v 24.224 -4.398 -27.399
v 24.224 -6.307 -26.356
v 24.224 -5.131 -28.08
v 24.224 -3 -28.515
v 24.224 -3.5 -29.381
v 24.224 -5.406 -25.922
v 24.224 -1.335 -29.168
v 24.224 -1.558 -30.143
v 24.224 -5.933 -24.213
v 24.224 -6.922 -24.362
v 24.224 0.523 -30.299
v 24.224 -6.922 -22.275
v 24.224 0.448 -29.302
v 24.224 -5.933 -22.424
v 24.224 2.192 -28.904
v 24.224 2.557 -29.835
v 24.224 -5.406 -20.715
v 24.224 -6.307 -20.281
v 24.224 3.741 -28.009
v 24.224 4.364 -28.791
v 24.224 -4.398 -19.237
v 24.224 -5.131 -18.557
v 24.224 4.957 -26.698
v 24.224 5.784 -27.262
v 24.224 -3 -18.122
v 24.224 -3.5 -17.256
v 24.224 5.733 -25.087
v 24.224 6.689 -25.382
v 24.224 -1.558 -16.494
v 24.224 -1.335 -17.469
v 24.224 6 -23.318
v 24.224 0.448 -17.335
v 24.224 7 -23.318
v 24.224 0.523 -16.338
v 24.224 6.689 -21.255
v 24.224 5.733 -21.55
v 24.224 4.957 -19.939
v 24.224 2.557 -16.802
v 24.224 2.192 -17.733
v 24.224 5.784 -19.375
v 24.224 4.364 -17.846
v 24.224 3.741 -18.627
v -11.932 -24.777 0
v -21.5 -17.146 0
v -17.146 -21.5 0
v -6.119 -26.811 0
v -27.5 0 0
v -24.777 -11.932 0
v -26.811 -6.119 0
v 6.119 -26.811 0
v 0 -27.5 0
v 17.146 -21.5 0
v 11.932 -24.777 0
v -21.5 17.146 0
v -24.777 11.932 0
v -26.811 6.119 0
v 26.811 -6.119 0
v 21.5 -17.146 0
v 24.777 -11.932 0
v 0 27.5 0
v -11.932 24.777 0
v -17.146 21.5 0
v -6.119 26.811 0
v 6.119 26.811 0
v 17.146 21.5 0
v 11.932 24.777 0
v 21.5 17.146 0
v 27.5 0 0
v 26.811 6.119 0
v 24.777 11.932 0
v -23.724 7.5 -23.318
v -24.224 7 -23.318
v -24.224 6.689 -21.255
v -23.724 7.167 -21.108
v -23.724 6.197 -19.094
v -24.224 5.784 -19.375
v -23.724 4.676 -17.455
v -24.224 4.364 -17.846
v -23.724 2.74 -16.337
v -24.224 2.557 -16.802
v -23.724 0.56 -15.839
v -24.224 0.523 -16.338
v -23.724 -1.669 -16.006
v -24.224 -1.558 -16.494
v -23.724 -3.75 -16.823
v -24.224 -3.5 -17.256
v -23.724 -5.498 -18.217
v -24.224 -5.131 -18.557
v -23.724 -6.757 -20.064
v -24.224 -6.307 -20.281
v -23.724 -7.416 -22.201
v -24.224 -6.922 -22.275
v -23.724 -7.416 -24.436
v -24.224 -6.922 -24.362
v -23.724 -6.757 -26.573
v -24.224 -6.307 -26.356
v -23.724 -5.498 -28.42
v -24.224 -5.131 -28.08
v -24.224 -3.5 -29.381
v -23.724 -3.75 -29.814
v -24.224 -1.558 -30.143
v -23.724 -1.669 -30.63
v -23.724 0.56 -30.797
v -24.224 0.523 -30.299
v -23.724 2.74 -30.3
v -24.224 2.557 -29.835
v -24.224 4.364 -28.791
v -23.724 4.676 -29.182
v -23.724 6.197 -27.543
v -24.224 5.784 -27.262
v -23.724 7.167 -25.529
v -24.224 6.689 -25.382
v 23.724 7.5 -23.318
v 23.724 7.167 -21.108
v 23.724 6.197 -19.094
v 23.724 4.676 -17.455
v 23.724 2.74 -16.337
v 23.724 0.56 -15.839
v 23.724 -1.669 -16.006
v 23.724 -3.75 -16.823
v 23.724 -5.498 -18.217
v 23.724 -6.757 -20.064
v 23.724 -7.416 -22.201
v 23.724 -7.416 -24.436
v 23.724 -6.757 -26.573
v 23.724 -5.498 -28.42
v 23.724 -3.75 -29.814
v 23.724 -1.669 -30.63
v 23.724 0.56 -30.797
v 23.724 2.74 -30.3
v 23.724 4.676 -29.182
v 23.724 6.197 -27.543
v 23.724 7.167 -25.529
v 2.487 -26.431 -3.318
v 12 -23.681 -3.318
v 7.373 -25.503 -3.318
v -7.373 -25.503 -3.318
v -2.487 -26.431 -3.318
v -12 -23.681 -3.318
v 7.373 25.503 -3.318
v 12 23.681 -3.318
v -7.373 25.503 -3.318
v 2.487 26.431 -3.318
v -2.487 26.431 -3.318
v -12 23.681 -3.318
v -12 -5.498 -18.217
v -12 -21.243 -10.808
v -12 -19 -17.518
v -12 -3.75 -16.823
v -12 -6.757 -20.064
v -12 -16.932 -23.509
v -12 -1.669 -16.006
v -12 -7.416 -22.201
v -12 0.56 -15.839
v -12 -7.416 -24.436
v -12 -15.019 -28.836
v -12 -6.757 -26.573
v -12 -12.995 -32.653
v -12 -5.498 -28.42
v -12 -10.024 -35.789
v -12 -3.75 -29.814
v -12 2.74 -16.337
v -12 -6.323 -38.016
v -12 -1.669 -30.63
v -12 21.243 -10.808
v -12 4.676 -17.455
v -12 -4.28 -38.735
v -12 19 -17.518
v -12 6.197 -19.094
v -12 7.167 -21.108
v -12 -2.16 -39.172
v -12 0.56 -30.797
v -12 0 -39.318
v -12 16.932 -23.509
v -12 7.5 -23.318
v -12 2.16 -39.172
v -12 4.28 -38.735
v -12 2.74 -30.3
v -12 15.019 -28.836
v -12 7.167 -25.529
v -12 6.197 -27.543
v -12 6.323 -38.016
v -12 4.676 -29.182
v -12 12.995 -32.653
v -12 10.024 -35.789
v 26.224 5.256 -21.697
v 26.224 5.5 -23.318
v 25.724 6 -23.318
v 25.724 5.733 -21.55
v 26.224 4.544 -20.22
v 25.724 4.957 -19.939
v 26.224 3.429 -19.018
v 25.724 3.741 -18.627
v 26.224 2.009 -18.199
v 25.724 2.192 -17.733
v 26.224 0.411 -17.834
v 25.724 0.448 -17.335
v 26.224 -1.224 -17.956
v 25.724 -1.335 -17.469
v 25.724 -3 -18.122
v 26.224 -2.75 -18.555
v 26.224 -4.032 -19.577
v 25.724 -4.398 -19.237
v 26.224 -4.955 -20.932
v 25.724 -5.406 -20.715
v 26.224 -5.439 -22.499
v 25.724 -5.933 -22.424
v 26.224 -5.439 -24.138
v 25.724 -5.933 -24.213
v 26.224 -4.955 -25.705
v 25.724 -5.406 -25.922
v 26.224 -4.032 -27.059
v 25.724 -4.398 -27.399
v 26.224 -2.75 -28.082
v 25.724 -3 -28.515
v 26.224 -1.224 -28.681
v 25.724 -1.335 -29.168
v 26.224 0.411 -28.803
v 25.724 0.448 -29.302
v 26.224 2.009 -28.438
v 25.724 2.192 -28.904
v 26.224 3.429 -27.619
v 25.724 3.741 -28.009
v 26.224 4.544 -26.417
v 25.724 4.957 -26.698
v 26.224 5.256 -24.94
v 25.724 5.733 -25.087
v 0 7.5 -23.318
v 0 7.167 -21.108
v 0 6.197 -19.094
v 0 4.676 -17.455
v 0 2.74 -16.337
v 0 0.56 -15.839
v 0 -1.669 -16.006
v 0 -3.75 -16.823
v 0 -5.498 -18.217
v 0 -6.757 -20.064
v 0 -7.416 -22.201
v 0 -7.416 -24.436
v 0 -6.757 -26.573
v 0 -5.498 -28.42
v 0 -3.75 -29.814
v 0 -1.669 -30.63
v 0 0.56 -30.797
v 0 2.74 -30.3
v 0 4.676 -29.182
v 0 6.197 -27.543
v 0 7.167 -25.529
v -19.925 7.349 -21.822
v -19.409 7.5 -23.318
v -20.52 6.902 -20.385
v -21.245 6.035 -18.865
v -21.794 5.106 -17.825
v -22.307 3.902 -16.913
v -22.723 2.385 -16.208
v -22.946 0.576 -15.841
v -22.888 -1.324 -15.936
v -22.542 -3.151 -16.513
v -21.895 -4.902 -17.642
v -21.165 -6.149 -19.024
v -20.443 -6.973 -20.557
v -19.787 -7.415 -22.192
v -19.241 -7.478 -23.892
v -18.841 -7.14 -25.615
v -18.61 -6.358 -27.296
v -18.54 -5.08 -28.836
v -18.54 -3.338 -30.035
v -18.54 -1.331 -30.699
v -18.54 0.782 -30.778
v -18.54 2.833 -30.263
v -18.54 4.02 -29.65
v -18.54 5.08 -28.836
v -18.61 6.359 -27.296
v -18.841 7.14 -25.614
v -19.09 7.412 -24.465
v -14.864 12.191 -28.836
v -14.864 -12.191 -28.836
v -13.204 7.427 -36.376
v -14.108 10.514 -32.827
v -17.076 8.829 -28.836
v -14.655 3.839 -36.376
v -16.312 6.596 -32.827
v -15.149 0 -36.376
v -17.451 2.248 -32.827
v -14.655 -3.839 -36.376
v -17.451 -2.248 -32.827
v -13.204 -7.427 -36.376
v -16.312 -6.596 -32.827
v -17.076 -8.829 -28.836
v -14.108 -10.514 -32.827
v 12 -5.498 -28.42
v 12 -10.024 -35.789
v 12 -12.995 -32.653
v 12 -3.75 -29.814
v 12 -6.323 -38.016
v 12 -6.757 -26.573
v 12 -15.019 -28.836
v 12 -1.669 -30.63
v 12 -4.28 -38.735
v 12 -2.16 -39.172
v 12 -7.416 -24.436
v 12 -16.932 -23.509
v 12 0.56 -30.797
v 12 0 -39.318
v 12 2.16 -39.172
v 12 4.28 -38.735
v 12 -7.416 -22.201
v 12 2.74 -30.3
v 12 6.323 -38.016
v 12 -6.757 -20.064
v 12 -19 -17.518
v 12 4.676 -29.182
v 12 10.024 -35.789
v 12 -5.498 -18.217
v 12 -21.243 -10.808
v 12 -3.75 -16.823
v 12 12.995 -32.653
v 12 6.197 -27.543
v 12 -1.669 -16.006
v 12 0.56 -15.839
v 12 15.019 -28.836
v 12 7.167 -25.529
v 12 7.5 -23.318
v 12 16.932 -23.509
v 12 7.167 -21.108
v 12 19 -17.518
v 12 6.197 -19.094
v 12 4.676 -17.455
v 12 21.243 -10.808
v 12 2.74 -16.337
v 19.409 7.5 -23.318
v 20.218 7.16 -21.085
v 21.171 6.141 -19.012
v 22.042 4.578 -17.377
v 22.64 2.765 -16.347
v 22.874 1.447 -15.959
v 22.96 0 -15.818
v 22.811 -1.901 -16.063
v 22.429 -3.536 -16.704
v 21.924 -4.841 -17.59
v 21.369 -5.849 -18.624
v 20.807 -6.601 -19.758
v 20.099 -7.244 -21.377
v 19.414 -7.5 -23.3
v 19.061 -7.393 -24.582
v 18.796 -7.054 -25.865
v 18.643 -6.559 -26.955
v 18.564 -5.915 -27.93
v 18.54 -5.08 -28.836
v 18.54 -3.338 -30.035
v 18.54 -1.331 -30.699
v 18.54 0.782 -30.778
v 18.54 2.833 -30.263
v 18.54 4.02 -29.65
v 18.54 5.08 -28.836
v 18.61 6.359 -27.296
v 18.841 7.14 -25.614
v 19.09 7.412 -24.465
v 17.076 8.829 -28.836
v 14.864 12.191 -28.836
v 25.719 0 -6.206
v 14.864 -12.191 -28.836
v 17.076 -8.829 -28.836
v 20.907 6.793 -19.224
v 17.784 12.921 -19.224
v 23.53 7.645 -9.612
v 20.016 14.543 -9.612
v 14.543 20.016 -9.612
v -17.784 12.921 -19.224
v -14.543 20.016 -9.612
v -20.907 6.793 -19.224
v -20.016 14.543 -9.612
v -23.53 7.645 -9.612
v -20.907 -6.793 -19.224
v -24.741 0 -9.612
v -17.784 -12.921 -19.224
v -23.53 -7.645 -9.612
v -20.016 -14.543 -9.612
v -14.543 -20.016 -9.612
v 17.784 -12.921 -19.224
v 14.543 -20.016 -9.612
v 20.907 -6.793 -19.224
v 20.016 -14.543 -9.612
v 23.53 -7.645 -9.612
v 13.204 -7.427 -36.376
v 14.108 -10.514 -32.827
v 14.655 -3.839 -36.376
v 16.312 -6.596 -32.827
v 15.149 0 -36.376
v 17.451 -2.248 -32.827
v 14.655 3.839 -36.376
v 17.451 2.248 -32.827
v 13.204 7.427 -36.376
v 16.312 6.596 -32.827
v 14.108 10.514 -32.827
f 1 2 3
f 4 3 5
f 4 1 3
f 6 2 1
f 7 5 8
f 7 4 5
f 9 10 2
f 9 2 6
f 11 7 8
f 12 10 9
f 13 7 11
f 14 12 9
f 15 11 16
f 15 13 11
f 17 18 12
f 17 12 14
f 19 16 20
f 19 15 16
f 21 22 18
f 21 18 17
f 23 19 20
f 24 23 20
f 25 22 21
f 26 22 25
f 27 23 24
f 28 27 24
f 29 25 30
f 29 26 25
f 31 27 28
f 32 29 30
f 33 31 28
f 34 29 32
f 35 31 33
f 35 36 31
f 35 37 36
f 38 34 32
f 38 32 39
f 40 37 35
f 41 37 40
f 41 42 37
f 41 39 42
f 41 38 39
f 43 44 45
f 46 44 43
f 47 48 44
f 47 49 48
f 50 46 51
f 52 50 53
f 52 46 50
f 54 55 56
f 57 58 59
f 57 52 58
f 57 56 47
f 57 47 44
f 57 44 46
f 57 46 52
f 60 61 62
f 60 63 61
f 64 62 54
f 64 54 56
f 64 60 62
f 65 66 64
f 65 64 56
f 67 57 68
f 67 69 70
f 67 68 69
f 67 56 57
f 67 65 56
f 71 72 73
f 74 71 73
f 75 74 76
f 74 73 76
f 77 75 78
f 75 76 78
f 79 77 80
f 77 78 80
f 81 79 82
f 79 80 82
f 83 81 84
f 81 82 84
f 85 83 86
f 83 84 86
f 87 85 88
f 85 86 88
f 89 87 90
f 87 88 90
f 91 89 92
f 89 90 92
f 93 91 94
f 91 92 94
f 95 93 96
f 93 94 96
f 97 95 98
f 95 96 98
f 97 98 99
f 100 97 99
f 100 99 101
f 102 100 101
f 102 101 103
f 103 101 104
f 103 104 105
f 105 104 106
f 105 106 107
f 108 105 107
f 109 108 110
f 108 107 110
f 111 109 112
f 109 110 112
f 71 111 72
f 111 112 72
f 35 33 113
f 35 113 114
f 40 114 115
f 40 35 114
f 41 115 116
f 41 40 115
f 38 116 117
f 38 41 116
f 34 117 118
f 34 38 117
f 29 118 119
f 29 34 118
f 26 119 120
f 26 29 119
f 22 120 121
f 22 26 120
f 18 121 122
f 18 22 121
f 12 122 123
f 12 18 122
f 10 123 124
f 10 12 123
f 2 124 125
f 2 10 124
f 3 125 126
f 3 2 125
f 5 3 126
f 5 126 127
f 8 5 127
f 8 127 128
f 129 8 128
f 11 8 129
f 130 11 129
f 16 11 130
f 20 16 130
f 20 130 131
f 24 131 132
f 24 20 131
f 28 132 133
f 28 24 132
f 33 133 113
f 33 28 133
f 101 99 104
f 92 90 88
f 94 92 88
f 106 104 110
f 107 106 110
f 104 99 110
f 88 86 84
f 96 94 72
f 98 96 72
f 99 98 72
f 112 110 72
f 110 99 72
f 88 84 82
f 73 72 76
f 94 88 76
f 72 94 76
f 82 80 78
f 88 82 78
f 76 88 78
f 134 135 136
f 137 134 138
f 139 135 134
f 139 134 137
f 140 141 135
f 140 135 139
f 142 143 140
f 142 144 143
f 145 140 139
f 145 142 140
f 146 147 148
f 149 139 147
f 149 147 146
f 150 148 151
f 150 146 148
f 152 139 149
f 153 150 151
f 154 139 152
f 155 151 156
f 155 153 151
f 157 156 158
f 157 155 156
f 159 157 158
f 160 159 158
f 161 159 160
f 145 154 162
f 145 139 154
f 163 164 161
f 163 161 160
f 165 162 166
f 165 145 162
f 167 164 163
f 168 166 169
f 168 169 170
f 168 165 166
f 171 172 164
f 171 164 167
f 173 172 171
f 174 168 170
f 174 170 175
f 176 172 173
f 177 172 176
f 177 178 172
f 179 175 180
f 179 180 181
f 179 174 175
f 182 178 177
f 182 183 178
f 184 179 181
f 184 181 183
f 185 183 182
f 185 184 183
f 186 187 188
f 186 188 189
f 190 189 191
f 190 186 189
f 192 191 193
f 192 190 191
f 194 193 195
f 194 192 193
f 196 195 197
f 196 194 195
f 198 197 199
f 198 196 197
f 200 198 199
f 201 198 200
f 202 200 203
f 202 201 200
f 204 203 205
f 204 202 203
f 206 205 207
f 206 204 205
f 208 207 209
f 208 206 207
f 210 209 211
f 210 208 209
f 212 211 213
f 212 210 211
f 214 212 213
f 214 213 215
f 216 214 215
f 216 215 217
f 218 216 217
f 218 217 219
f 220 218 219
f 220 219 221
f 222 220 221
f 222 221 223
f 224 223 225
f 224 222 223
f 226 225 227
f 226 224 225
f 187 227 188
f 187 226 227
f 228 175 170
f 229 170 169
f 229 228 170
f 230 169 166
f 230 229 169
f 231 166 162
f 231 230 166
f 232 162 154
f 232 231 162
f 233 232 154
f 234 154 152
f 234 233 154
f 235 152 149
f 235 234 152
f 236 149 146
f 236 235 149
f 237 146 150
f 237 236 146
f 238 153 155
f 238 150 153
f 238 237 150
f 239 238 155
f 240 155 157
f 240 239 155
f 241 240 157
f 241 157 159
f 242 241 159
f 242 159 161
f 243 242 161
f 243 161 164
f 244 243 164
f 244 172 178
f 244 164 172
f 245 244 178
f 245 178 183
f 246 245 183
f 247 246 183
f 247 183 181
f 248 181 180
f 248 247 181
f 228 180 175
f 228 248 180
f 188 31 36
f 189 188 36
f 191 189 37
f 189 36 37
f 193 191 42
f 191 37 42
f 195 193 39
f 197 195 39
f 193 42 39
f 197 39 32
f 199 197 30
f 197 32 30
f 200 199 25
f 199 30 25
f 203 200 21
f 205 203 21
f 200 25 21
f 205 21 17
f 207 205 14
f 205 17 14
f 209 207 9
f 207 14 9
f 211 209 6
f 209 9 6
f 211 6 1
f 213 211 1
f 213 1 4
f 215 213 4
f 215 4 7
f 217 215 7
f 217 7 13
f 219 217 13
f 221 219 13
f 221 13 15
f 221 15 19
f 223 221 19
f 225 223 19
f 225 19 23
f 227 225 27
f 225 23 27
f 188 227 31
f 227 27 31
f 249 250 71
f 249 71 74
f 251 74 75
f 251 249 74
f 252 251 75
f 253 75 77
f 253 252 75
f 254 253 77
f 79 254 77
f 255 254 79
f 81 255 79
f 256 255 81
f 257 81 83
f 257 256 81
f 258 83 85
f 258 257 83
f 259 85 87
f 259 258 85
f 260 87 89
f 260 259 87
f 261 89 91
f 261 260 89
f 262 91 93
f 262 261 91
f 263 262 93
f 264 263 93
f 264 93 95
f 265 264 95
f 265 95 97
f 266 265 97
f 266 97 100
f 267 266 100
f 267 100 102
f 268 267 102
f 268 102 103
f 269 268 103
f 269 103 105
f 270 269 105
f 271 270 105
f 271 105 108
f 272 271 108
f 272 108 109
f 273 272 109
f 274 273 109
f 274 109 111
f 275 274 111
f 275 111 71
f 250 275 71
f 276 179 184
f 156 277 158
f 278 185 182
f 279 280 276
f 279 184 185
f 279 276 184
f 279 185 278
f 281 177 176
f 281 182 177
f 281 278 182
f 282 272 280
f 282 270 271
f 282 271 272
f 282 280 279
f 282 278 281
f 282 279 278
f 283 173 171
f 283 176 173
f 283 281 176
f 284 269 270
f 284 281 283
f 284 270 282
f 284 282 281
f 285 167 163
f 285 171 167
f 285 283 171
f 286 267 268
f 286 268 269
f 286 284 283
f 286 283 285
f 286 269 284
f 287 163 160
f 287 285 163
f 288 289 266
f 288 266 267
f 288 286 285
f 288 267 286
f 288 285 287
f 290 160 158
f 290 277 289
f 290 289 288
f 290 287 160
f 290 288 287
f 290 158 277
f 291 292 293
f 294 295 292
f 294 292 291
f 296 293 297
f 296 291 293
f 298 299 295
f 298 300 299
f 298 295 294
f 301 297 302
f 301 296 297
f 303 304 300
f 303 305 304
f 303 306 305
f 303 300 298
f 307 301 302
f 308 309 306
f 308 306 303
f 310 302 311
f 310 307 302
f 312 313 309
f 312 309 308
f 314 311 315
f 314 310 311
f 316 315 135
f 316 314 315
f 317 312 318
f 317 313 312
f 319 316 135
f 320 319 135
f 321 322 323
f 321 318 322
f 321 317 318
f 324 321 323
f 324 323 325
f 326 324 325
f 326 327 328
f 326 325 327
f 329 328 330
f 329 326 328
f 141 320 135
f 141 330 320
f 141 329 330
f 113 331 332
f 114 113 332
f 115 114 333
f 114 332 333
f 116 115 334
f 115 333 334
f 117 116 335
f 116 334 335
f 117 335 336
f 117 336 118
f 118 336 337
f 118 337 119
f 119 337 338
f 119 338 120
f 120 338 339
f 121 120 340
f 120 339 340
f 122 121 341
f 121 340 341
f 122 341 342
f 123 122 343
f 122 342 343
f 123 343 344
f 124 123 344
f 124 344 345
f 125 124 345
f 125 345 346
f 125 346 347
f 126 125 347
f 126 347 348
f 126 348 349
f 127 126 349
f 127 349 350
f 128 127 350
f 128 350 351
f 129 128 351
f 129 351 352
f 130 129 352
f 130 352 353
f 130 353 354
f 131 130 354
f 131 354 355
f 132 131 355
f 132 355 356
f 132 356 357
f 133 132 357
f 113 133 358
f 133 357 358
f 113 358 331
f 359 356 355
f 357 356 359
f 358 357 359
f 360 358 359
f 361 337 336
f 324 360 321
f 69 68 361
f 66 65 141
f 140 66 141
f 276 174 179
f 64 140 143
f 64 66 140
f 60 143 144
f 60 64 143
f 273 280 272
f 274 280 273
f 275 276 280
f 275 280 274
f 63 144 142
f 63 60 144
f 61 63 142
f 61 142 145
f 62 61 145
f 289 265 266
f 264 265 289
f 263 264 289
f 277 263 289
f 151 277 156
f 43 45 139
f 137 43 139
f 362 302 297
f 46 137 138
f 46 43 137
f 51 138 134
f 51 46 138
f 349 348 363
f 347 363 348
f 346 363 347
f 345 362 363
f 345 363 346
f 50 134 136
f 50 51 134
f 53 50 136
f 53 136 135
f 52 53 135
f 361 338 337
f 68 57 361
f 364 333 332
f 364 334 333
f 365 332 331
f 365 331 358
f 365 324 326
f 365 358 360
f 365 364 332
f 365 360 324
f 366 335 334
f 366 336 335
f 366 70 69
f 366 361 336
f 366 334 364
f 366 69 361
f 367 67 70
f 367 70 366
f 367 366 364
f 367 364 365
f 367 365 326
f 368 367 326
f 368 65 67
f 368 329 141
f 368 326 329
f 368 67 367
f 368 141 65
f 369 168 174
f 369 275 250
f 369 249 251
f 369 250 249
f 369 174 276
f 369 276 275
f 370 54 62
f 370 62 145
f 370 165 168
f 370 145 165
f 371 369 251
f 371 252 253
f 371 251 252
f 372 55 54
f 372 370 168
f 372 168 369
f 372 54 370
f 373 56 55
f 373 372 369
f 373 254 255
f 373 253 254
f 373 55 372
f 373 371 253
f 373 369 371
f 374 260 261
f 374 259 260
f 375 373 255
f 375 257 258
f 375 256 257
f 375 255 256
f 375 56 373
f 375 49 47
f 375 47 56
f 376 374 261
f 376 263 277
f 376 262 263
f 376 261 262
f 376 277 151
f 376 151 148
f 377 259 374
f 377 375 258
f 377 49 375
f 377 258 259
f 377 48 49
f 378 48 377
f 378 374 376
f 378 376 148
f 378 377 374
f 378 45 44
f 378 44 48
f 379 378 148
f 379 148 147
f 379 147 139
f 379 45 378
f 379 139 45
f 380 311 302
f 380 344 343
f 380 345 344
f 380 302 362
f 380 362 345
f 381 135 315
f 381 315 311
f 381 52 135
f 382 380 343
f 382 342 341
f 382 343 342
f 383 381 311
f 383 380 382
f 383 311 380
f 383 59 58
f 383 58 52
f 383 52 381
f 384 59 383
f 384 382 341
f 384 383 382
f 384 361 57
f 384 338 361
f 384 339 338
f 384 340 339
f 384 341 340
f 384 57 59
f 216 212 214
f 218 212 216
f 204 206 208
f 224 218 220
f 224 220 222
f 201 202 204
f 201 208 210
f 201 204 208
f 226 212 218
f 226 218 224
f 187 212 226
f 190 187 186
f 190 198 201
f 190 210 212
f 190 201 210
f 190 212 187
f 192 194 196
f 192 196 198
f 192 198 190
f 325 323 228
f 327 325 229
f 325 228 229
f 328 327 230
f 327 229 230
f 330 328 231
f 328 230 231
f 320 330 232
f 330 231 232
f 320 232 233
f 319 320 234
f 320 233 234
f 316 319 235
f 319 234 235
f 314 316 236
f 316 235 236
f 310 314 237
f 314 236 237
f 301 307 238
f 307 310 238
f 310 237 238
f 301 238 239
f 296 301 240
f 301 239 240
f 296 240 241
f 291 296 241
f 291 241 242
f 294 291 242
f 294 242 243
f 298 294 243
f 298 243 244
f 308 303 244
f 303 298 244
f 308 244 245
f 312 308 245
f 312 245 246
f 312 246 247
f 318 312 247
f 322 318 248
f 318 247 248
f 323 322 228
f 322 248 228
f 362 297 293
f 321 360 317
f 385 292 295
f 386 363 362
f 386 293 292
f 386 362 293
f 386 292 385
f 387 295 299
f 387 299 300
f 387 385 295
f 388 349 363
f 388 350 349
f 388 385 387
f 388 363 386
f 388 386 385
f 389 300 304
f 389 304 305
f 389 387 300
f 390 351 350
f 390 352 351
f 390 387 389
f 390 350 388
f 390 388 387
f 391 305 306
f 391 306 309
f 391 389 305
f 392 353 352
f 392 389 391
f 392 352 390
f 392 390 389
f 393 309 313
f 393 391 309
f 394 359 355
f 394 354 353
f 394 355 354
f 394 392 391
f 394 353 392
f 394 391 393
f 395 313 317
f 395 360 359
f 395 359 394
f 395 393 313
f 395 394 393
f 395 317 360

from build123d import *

# Parameters (mm, degrees)
F3_DEPTH      = 27.501
F3_DEPTH_BACK = 27.501
F4_R          = 7.5
F5_DEPTH      = 24.2238989074
F7_R          = 6
F8_DEPTH      = 2
F8_DEPTH_BACK = 12.2238989074
F9_SIZE       = 0.5


with BuildPart() as f1:
    # F0 (on Front) → F1 (revolve)
    with BuildSketch(Plane.XZ):
        with BuildLine():
            Line((27.5, 0), (0, 0))
            Line((0, 0), (0, -43.3184476327))
            ThreePointArc((0, -43.3184476327), (12.0343671506, -39.2926145056), (19.2238989074, -28.8358483611))
            Line((19.2238989074, -28.8358483611), (27.5, 0))
        make_face()
    revolve(axis=Axis((0, 0, 4.3592059342), (0, 0, 1)))

    # F2 (on Front) → F3 (cut, two sides)
    with BuildSketch(Plane.XZ) as f3_sk:
        Polygon((0, -43.3184476327), (12, -43.3184476327), (12, -3.3184476327), (0, -3.3184476327), (-12, -3.3184476327), (-12, -43.3184476327), align=None)
    extrude(amount=-F3_DEPTH, mode=Mode.SUBTRACT)
    extrude(f3_sk.sketch, amount=F3_DEPTH_BACK, mode=Mode.SUBTRACT)

    # F4 (on Right) → F5 (join, through all)
    with BuildSketch(Plane.YZ):
        with Locations((0, -23.3184476327)):
            Circle(F4_R)
    extrude(amount=F5_DEPTH)

    # F6: F1 across plane


with BuildPart() as f1_1:
    add(f1.part)
    add(f1.part.mirror(Plane.YZ))

    # F7 (on face) → F8 (join, two sides)
    with BuildSketch(Plane.YZ.offset(24.2238989074)) as f8_sk:
        with Locations((0, -23.3184476327)):
            Circle(F7_R)
    extrude(amount=F8_DEPTH)
    extrude(f8_sk.sketch, amount=-F8_DEPTH_BACK)

    # F9
    f9_edges = [f1_1.edges().sort_by_distance(p)[0] for p in [
        (26.223899, -6, -23.318448),
        (-24.223899, -7.5, -23.318448),
        (24.223899, -7.5, -23.318448),
    ]]
    chamfer(f9_edges, length=F9_SIZE)


solid = f1_1.part
